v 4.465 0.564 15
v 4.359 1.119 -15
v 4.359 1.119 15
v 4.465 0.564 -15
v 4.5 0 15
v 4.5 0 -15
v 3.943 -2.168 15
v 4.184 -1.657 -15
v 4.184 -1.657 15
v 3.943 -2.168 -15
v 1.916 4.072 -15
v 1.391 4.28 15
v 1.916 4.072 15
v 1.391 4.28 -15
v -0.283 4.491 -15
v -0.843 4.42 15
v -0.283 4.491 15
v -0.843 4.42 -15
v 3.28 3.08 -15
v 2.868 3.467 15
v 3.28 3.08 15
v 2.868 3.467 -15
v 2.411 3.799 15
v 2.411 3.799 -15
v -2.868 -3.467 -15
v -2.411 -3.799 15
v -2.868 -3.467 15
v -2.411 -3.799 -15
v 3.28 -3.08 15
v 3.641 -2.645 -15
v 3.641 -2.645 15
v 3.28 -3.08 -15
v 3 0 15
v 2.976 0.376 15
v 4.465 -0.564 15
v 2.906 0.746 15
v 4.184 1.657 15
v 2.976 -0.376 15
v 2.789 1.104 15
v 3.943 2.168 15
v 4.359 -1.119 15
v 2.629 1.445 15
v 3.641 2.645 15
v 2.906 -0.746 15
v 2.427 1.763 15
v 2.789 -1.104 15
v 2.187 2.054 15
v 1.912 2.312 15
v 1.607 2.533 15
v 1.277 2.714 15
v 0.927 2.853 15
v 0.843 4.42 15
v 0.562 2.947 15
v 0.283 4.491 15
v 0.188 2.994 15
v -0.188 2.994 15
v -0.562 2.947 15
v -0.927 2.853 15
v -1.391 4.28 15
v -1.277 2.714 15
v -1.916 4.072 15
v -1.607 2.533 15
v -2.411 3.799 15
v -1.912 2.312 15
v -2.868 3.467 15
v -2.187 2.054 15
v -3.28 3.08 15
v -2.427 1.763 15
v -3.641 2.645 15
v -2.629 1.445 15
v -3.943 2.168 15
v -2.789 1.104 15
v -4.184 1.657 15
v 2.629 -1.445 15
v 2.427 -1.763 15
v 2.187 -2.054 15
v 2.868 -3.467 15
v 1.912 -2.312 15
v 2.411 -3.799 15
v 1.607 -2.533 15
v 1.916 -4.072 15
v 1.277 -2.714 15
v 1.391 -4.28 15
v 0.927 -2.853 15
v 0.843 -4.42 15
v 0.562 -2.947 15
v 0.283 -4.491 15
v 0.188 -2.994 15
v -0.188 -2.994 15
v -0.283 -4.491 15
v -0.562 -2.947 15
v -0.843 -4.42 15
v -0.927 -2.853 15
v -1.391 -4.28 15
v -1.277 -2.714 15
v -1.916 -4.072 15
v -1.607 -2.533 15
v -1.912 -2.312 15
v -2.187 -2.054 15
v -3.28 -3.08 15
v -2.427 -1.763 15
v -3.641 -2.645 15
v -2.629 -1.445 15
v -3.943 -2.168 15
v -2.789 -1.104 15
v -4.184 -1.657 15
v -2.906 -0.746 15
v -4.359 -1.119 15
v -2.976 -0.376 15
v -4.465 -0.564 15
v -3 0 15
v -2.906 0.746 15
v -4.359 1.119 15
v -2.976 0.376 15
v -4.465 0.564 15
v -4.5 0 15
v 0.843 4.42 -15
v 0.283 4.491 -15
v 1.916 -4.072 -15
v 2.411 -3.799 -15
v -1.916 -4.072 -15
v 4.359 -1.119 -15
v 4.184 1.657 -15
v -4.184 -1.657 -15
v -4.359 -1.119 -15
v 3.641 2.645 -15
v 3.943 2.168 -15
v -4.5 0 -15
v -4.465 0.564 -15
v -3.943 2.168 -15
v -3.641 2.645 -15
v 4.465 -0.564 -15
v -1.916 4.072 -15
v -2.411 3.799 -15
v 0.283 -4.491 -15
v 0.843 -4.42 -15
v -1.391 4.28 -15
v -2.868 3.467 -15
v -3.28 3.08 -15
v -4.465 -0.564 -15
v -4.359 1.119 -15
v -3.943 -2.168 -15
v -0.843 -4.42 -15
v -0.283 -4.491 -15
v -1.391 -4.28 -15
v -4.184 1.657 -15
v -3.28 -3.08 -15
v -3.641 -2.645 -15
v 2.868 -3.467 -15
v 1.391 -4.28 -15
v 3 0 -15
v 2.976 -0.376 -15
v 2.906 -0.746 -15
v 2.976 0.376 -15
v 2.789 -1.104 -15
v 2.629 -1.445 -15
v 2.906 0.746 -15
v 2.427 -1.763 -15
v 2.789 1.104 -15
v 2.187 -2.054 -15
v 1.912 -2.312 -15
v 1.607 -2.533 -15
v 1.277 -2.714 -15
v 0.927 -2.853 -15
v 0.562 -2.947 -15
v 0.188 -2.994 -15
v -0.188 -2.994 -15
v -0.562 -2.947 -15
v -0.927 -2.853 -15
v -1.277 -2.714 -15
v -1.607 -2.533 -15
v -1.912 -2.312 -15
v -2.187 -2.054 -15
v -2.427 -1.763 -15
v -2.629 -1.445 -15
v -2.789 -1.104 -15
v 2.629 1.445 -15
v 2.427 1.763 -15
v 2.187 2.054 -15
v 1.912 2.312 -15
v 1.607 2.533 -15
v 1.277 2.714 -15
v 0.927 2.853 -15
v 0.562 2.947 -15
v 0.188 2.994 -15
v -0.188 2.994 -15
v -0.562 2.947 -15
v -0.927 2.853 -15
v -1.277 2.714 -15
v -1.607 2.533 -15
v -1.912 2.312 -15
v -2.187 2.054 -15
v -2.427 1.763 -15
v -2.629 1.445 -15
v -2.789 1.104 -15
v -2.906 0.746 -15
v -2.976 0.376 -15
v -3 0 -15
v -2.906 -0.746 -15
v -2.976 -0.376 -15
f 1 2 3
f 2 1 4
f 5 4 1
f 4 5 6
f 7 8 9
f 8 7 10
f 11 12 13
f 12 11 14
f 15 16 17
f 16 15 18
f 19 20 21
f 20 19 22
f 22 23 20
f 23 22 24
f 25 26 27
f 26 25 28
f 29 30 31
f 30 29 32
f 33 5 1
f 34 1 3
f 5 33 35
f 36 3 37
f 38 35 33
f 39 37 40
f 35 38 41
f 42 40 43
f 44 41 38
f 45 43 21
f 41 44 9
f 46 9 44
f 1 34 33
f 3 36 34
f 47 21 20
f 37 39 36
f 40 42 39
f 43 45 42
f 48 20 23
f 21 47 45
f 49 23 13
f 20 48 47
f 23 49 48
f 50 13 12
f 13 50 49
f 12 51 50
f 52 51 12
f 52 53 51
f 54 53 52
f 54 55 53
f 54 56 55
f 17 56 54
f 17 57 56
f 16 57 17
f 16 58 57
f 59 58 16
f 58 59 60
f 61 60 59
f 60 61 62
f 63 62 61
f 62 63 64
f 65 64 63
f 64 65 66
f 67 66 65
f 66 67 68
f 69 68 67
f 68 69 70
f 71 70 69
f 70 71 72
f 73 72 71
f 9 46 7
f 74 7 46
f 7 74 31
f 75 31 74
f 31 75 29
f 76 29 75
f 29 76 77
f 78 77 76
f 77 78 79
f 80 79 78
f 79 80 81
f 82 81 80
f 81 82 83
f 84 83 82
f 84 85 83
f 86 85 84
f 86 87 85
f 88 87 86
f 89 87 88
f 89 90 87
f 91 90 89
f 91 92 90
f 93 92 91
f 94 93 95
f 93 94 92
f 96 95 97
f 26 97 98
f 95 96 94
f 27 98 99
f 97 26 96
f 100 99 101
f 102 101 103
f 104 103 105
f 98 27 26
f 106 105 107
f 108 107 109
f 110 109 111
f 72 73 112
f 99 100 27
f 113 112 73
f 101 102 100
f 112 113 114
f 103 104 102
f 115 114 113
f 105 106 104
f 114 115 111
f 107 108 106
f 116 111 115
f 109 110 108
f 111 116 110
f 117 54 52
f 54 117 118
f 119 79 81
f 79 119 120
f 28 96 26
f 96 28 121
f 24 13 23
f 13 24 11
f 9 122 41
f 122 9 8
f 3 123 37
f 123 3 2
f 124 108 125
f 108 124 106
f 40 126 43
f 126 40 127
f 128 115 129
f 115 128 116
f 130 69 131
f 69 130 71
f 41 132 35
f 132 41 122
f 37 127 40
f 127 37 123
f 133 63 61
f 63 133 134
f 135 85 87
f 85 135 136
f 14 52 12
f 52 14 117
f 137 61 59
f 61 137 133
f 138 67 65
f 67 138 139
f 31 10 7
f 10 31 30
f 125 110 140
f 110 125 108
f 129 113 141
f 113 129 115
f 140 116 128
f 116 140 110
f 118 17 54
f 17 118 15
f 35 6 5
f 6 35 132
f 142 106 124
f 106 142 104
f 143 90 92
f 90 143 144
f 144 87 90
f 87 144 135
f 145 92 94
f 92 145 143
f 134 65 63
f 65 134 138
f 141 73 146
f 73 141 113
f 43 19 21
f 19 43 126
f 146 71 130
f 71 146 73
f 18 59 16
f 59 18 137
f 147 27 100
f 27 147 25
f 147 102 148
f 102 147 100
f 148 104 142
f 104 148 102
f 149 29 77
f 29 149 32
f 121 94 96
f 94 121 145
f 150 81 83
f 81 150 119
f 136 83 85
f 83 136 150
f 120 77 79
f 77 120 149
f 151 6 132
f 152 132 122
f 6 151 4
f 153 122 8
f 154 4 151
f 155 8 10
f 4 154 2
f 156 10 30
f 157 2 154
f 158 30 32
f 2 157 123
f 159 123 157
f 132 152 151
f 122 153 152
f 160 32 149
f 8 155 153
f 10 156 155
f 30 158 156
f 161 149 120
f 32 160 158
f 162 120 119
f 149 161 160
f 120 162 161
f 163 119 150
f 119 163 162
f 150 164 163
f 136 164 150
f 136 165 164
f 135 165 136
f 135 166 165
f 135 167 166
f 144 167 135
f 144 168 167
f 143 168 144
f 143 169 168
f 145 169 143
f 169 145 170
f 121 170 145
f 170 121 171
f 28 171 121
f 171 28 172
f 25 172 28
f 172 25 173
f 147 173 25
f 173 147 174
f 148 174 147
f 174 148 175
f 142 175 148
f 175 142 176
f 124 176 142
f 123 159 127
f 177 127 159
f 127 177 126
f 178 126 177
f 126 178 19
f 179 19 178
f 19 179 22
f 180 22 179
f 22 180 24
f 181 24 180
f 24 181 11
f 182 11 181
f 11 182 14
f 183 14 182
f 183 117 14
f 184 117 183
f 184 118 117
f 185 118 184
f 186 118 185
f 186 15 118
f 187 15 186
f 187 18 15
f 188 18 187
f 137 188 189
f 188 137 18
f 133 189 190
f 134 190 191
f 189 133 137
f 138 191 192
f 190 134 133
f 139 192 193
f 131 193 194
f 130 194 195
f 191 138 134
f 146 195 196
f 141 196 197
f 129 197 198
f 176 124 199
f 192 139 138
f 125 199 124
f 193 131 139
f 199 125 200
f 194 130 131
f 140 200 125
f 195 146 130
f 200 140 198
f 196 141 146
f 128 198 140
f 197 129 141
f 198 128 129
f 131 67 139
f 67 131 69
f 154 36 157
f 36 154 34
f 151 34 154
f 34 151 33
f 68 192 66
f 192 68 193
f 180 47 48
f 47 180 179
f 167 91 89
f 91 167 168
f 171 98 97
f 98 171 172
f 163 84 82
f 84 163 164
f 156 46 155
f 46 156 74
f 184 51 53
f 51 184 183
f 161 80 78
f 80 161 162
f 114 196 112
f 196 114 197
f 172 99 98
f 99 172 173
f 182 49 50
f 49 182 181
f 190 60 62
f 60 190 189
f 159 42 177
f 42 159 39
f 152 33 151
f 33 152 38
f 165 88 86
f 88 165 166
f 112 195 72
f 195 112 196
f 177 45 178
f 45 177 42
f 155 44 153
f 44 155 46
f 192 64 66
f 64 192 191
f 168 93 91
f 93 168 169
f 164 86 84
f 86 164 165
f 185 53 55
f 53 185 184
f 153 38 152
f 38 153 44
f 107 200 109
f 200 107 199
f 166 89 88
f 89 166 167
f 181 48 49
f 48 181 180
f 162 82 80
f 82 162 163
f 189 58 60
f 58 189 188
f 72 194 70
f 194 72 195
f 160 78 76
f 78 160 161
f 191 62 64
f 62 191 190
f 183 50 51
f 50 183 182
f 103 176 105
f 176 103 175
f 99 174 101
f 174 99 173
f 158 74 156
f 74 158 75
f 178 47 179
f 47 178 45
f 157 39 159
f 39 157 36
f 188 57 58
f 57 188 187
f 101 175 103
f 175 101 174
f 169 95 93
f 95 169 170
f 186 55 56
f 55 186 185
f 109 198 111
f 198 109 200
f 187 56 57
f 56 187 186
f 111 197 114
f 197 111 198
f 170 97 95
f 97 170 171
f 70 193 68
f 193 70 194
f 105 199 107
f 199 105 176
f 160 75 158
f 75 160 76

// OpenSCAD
$fn = 50;


difference() {
	union() {
		translate(v = [0, 0, -15.0000000000]) {
			cylinder(h = 30, r = 4.5000000000);
		}
	}
	union() {
		translate(v = [0, 0, -100.0000000000]) {
			cylinder(h = 200, r = 3.0000000000);
		}
	}
}
